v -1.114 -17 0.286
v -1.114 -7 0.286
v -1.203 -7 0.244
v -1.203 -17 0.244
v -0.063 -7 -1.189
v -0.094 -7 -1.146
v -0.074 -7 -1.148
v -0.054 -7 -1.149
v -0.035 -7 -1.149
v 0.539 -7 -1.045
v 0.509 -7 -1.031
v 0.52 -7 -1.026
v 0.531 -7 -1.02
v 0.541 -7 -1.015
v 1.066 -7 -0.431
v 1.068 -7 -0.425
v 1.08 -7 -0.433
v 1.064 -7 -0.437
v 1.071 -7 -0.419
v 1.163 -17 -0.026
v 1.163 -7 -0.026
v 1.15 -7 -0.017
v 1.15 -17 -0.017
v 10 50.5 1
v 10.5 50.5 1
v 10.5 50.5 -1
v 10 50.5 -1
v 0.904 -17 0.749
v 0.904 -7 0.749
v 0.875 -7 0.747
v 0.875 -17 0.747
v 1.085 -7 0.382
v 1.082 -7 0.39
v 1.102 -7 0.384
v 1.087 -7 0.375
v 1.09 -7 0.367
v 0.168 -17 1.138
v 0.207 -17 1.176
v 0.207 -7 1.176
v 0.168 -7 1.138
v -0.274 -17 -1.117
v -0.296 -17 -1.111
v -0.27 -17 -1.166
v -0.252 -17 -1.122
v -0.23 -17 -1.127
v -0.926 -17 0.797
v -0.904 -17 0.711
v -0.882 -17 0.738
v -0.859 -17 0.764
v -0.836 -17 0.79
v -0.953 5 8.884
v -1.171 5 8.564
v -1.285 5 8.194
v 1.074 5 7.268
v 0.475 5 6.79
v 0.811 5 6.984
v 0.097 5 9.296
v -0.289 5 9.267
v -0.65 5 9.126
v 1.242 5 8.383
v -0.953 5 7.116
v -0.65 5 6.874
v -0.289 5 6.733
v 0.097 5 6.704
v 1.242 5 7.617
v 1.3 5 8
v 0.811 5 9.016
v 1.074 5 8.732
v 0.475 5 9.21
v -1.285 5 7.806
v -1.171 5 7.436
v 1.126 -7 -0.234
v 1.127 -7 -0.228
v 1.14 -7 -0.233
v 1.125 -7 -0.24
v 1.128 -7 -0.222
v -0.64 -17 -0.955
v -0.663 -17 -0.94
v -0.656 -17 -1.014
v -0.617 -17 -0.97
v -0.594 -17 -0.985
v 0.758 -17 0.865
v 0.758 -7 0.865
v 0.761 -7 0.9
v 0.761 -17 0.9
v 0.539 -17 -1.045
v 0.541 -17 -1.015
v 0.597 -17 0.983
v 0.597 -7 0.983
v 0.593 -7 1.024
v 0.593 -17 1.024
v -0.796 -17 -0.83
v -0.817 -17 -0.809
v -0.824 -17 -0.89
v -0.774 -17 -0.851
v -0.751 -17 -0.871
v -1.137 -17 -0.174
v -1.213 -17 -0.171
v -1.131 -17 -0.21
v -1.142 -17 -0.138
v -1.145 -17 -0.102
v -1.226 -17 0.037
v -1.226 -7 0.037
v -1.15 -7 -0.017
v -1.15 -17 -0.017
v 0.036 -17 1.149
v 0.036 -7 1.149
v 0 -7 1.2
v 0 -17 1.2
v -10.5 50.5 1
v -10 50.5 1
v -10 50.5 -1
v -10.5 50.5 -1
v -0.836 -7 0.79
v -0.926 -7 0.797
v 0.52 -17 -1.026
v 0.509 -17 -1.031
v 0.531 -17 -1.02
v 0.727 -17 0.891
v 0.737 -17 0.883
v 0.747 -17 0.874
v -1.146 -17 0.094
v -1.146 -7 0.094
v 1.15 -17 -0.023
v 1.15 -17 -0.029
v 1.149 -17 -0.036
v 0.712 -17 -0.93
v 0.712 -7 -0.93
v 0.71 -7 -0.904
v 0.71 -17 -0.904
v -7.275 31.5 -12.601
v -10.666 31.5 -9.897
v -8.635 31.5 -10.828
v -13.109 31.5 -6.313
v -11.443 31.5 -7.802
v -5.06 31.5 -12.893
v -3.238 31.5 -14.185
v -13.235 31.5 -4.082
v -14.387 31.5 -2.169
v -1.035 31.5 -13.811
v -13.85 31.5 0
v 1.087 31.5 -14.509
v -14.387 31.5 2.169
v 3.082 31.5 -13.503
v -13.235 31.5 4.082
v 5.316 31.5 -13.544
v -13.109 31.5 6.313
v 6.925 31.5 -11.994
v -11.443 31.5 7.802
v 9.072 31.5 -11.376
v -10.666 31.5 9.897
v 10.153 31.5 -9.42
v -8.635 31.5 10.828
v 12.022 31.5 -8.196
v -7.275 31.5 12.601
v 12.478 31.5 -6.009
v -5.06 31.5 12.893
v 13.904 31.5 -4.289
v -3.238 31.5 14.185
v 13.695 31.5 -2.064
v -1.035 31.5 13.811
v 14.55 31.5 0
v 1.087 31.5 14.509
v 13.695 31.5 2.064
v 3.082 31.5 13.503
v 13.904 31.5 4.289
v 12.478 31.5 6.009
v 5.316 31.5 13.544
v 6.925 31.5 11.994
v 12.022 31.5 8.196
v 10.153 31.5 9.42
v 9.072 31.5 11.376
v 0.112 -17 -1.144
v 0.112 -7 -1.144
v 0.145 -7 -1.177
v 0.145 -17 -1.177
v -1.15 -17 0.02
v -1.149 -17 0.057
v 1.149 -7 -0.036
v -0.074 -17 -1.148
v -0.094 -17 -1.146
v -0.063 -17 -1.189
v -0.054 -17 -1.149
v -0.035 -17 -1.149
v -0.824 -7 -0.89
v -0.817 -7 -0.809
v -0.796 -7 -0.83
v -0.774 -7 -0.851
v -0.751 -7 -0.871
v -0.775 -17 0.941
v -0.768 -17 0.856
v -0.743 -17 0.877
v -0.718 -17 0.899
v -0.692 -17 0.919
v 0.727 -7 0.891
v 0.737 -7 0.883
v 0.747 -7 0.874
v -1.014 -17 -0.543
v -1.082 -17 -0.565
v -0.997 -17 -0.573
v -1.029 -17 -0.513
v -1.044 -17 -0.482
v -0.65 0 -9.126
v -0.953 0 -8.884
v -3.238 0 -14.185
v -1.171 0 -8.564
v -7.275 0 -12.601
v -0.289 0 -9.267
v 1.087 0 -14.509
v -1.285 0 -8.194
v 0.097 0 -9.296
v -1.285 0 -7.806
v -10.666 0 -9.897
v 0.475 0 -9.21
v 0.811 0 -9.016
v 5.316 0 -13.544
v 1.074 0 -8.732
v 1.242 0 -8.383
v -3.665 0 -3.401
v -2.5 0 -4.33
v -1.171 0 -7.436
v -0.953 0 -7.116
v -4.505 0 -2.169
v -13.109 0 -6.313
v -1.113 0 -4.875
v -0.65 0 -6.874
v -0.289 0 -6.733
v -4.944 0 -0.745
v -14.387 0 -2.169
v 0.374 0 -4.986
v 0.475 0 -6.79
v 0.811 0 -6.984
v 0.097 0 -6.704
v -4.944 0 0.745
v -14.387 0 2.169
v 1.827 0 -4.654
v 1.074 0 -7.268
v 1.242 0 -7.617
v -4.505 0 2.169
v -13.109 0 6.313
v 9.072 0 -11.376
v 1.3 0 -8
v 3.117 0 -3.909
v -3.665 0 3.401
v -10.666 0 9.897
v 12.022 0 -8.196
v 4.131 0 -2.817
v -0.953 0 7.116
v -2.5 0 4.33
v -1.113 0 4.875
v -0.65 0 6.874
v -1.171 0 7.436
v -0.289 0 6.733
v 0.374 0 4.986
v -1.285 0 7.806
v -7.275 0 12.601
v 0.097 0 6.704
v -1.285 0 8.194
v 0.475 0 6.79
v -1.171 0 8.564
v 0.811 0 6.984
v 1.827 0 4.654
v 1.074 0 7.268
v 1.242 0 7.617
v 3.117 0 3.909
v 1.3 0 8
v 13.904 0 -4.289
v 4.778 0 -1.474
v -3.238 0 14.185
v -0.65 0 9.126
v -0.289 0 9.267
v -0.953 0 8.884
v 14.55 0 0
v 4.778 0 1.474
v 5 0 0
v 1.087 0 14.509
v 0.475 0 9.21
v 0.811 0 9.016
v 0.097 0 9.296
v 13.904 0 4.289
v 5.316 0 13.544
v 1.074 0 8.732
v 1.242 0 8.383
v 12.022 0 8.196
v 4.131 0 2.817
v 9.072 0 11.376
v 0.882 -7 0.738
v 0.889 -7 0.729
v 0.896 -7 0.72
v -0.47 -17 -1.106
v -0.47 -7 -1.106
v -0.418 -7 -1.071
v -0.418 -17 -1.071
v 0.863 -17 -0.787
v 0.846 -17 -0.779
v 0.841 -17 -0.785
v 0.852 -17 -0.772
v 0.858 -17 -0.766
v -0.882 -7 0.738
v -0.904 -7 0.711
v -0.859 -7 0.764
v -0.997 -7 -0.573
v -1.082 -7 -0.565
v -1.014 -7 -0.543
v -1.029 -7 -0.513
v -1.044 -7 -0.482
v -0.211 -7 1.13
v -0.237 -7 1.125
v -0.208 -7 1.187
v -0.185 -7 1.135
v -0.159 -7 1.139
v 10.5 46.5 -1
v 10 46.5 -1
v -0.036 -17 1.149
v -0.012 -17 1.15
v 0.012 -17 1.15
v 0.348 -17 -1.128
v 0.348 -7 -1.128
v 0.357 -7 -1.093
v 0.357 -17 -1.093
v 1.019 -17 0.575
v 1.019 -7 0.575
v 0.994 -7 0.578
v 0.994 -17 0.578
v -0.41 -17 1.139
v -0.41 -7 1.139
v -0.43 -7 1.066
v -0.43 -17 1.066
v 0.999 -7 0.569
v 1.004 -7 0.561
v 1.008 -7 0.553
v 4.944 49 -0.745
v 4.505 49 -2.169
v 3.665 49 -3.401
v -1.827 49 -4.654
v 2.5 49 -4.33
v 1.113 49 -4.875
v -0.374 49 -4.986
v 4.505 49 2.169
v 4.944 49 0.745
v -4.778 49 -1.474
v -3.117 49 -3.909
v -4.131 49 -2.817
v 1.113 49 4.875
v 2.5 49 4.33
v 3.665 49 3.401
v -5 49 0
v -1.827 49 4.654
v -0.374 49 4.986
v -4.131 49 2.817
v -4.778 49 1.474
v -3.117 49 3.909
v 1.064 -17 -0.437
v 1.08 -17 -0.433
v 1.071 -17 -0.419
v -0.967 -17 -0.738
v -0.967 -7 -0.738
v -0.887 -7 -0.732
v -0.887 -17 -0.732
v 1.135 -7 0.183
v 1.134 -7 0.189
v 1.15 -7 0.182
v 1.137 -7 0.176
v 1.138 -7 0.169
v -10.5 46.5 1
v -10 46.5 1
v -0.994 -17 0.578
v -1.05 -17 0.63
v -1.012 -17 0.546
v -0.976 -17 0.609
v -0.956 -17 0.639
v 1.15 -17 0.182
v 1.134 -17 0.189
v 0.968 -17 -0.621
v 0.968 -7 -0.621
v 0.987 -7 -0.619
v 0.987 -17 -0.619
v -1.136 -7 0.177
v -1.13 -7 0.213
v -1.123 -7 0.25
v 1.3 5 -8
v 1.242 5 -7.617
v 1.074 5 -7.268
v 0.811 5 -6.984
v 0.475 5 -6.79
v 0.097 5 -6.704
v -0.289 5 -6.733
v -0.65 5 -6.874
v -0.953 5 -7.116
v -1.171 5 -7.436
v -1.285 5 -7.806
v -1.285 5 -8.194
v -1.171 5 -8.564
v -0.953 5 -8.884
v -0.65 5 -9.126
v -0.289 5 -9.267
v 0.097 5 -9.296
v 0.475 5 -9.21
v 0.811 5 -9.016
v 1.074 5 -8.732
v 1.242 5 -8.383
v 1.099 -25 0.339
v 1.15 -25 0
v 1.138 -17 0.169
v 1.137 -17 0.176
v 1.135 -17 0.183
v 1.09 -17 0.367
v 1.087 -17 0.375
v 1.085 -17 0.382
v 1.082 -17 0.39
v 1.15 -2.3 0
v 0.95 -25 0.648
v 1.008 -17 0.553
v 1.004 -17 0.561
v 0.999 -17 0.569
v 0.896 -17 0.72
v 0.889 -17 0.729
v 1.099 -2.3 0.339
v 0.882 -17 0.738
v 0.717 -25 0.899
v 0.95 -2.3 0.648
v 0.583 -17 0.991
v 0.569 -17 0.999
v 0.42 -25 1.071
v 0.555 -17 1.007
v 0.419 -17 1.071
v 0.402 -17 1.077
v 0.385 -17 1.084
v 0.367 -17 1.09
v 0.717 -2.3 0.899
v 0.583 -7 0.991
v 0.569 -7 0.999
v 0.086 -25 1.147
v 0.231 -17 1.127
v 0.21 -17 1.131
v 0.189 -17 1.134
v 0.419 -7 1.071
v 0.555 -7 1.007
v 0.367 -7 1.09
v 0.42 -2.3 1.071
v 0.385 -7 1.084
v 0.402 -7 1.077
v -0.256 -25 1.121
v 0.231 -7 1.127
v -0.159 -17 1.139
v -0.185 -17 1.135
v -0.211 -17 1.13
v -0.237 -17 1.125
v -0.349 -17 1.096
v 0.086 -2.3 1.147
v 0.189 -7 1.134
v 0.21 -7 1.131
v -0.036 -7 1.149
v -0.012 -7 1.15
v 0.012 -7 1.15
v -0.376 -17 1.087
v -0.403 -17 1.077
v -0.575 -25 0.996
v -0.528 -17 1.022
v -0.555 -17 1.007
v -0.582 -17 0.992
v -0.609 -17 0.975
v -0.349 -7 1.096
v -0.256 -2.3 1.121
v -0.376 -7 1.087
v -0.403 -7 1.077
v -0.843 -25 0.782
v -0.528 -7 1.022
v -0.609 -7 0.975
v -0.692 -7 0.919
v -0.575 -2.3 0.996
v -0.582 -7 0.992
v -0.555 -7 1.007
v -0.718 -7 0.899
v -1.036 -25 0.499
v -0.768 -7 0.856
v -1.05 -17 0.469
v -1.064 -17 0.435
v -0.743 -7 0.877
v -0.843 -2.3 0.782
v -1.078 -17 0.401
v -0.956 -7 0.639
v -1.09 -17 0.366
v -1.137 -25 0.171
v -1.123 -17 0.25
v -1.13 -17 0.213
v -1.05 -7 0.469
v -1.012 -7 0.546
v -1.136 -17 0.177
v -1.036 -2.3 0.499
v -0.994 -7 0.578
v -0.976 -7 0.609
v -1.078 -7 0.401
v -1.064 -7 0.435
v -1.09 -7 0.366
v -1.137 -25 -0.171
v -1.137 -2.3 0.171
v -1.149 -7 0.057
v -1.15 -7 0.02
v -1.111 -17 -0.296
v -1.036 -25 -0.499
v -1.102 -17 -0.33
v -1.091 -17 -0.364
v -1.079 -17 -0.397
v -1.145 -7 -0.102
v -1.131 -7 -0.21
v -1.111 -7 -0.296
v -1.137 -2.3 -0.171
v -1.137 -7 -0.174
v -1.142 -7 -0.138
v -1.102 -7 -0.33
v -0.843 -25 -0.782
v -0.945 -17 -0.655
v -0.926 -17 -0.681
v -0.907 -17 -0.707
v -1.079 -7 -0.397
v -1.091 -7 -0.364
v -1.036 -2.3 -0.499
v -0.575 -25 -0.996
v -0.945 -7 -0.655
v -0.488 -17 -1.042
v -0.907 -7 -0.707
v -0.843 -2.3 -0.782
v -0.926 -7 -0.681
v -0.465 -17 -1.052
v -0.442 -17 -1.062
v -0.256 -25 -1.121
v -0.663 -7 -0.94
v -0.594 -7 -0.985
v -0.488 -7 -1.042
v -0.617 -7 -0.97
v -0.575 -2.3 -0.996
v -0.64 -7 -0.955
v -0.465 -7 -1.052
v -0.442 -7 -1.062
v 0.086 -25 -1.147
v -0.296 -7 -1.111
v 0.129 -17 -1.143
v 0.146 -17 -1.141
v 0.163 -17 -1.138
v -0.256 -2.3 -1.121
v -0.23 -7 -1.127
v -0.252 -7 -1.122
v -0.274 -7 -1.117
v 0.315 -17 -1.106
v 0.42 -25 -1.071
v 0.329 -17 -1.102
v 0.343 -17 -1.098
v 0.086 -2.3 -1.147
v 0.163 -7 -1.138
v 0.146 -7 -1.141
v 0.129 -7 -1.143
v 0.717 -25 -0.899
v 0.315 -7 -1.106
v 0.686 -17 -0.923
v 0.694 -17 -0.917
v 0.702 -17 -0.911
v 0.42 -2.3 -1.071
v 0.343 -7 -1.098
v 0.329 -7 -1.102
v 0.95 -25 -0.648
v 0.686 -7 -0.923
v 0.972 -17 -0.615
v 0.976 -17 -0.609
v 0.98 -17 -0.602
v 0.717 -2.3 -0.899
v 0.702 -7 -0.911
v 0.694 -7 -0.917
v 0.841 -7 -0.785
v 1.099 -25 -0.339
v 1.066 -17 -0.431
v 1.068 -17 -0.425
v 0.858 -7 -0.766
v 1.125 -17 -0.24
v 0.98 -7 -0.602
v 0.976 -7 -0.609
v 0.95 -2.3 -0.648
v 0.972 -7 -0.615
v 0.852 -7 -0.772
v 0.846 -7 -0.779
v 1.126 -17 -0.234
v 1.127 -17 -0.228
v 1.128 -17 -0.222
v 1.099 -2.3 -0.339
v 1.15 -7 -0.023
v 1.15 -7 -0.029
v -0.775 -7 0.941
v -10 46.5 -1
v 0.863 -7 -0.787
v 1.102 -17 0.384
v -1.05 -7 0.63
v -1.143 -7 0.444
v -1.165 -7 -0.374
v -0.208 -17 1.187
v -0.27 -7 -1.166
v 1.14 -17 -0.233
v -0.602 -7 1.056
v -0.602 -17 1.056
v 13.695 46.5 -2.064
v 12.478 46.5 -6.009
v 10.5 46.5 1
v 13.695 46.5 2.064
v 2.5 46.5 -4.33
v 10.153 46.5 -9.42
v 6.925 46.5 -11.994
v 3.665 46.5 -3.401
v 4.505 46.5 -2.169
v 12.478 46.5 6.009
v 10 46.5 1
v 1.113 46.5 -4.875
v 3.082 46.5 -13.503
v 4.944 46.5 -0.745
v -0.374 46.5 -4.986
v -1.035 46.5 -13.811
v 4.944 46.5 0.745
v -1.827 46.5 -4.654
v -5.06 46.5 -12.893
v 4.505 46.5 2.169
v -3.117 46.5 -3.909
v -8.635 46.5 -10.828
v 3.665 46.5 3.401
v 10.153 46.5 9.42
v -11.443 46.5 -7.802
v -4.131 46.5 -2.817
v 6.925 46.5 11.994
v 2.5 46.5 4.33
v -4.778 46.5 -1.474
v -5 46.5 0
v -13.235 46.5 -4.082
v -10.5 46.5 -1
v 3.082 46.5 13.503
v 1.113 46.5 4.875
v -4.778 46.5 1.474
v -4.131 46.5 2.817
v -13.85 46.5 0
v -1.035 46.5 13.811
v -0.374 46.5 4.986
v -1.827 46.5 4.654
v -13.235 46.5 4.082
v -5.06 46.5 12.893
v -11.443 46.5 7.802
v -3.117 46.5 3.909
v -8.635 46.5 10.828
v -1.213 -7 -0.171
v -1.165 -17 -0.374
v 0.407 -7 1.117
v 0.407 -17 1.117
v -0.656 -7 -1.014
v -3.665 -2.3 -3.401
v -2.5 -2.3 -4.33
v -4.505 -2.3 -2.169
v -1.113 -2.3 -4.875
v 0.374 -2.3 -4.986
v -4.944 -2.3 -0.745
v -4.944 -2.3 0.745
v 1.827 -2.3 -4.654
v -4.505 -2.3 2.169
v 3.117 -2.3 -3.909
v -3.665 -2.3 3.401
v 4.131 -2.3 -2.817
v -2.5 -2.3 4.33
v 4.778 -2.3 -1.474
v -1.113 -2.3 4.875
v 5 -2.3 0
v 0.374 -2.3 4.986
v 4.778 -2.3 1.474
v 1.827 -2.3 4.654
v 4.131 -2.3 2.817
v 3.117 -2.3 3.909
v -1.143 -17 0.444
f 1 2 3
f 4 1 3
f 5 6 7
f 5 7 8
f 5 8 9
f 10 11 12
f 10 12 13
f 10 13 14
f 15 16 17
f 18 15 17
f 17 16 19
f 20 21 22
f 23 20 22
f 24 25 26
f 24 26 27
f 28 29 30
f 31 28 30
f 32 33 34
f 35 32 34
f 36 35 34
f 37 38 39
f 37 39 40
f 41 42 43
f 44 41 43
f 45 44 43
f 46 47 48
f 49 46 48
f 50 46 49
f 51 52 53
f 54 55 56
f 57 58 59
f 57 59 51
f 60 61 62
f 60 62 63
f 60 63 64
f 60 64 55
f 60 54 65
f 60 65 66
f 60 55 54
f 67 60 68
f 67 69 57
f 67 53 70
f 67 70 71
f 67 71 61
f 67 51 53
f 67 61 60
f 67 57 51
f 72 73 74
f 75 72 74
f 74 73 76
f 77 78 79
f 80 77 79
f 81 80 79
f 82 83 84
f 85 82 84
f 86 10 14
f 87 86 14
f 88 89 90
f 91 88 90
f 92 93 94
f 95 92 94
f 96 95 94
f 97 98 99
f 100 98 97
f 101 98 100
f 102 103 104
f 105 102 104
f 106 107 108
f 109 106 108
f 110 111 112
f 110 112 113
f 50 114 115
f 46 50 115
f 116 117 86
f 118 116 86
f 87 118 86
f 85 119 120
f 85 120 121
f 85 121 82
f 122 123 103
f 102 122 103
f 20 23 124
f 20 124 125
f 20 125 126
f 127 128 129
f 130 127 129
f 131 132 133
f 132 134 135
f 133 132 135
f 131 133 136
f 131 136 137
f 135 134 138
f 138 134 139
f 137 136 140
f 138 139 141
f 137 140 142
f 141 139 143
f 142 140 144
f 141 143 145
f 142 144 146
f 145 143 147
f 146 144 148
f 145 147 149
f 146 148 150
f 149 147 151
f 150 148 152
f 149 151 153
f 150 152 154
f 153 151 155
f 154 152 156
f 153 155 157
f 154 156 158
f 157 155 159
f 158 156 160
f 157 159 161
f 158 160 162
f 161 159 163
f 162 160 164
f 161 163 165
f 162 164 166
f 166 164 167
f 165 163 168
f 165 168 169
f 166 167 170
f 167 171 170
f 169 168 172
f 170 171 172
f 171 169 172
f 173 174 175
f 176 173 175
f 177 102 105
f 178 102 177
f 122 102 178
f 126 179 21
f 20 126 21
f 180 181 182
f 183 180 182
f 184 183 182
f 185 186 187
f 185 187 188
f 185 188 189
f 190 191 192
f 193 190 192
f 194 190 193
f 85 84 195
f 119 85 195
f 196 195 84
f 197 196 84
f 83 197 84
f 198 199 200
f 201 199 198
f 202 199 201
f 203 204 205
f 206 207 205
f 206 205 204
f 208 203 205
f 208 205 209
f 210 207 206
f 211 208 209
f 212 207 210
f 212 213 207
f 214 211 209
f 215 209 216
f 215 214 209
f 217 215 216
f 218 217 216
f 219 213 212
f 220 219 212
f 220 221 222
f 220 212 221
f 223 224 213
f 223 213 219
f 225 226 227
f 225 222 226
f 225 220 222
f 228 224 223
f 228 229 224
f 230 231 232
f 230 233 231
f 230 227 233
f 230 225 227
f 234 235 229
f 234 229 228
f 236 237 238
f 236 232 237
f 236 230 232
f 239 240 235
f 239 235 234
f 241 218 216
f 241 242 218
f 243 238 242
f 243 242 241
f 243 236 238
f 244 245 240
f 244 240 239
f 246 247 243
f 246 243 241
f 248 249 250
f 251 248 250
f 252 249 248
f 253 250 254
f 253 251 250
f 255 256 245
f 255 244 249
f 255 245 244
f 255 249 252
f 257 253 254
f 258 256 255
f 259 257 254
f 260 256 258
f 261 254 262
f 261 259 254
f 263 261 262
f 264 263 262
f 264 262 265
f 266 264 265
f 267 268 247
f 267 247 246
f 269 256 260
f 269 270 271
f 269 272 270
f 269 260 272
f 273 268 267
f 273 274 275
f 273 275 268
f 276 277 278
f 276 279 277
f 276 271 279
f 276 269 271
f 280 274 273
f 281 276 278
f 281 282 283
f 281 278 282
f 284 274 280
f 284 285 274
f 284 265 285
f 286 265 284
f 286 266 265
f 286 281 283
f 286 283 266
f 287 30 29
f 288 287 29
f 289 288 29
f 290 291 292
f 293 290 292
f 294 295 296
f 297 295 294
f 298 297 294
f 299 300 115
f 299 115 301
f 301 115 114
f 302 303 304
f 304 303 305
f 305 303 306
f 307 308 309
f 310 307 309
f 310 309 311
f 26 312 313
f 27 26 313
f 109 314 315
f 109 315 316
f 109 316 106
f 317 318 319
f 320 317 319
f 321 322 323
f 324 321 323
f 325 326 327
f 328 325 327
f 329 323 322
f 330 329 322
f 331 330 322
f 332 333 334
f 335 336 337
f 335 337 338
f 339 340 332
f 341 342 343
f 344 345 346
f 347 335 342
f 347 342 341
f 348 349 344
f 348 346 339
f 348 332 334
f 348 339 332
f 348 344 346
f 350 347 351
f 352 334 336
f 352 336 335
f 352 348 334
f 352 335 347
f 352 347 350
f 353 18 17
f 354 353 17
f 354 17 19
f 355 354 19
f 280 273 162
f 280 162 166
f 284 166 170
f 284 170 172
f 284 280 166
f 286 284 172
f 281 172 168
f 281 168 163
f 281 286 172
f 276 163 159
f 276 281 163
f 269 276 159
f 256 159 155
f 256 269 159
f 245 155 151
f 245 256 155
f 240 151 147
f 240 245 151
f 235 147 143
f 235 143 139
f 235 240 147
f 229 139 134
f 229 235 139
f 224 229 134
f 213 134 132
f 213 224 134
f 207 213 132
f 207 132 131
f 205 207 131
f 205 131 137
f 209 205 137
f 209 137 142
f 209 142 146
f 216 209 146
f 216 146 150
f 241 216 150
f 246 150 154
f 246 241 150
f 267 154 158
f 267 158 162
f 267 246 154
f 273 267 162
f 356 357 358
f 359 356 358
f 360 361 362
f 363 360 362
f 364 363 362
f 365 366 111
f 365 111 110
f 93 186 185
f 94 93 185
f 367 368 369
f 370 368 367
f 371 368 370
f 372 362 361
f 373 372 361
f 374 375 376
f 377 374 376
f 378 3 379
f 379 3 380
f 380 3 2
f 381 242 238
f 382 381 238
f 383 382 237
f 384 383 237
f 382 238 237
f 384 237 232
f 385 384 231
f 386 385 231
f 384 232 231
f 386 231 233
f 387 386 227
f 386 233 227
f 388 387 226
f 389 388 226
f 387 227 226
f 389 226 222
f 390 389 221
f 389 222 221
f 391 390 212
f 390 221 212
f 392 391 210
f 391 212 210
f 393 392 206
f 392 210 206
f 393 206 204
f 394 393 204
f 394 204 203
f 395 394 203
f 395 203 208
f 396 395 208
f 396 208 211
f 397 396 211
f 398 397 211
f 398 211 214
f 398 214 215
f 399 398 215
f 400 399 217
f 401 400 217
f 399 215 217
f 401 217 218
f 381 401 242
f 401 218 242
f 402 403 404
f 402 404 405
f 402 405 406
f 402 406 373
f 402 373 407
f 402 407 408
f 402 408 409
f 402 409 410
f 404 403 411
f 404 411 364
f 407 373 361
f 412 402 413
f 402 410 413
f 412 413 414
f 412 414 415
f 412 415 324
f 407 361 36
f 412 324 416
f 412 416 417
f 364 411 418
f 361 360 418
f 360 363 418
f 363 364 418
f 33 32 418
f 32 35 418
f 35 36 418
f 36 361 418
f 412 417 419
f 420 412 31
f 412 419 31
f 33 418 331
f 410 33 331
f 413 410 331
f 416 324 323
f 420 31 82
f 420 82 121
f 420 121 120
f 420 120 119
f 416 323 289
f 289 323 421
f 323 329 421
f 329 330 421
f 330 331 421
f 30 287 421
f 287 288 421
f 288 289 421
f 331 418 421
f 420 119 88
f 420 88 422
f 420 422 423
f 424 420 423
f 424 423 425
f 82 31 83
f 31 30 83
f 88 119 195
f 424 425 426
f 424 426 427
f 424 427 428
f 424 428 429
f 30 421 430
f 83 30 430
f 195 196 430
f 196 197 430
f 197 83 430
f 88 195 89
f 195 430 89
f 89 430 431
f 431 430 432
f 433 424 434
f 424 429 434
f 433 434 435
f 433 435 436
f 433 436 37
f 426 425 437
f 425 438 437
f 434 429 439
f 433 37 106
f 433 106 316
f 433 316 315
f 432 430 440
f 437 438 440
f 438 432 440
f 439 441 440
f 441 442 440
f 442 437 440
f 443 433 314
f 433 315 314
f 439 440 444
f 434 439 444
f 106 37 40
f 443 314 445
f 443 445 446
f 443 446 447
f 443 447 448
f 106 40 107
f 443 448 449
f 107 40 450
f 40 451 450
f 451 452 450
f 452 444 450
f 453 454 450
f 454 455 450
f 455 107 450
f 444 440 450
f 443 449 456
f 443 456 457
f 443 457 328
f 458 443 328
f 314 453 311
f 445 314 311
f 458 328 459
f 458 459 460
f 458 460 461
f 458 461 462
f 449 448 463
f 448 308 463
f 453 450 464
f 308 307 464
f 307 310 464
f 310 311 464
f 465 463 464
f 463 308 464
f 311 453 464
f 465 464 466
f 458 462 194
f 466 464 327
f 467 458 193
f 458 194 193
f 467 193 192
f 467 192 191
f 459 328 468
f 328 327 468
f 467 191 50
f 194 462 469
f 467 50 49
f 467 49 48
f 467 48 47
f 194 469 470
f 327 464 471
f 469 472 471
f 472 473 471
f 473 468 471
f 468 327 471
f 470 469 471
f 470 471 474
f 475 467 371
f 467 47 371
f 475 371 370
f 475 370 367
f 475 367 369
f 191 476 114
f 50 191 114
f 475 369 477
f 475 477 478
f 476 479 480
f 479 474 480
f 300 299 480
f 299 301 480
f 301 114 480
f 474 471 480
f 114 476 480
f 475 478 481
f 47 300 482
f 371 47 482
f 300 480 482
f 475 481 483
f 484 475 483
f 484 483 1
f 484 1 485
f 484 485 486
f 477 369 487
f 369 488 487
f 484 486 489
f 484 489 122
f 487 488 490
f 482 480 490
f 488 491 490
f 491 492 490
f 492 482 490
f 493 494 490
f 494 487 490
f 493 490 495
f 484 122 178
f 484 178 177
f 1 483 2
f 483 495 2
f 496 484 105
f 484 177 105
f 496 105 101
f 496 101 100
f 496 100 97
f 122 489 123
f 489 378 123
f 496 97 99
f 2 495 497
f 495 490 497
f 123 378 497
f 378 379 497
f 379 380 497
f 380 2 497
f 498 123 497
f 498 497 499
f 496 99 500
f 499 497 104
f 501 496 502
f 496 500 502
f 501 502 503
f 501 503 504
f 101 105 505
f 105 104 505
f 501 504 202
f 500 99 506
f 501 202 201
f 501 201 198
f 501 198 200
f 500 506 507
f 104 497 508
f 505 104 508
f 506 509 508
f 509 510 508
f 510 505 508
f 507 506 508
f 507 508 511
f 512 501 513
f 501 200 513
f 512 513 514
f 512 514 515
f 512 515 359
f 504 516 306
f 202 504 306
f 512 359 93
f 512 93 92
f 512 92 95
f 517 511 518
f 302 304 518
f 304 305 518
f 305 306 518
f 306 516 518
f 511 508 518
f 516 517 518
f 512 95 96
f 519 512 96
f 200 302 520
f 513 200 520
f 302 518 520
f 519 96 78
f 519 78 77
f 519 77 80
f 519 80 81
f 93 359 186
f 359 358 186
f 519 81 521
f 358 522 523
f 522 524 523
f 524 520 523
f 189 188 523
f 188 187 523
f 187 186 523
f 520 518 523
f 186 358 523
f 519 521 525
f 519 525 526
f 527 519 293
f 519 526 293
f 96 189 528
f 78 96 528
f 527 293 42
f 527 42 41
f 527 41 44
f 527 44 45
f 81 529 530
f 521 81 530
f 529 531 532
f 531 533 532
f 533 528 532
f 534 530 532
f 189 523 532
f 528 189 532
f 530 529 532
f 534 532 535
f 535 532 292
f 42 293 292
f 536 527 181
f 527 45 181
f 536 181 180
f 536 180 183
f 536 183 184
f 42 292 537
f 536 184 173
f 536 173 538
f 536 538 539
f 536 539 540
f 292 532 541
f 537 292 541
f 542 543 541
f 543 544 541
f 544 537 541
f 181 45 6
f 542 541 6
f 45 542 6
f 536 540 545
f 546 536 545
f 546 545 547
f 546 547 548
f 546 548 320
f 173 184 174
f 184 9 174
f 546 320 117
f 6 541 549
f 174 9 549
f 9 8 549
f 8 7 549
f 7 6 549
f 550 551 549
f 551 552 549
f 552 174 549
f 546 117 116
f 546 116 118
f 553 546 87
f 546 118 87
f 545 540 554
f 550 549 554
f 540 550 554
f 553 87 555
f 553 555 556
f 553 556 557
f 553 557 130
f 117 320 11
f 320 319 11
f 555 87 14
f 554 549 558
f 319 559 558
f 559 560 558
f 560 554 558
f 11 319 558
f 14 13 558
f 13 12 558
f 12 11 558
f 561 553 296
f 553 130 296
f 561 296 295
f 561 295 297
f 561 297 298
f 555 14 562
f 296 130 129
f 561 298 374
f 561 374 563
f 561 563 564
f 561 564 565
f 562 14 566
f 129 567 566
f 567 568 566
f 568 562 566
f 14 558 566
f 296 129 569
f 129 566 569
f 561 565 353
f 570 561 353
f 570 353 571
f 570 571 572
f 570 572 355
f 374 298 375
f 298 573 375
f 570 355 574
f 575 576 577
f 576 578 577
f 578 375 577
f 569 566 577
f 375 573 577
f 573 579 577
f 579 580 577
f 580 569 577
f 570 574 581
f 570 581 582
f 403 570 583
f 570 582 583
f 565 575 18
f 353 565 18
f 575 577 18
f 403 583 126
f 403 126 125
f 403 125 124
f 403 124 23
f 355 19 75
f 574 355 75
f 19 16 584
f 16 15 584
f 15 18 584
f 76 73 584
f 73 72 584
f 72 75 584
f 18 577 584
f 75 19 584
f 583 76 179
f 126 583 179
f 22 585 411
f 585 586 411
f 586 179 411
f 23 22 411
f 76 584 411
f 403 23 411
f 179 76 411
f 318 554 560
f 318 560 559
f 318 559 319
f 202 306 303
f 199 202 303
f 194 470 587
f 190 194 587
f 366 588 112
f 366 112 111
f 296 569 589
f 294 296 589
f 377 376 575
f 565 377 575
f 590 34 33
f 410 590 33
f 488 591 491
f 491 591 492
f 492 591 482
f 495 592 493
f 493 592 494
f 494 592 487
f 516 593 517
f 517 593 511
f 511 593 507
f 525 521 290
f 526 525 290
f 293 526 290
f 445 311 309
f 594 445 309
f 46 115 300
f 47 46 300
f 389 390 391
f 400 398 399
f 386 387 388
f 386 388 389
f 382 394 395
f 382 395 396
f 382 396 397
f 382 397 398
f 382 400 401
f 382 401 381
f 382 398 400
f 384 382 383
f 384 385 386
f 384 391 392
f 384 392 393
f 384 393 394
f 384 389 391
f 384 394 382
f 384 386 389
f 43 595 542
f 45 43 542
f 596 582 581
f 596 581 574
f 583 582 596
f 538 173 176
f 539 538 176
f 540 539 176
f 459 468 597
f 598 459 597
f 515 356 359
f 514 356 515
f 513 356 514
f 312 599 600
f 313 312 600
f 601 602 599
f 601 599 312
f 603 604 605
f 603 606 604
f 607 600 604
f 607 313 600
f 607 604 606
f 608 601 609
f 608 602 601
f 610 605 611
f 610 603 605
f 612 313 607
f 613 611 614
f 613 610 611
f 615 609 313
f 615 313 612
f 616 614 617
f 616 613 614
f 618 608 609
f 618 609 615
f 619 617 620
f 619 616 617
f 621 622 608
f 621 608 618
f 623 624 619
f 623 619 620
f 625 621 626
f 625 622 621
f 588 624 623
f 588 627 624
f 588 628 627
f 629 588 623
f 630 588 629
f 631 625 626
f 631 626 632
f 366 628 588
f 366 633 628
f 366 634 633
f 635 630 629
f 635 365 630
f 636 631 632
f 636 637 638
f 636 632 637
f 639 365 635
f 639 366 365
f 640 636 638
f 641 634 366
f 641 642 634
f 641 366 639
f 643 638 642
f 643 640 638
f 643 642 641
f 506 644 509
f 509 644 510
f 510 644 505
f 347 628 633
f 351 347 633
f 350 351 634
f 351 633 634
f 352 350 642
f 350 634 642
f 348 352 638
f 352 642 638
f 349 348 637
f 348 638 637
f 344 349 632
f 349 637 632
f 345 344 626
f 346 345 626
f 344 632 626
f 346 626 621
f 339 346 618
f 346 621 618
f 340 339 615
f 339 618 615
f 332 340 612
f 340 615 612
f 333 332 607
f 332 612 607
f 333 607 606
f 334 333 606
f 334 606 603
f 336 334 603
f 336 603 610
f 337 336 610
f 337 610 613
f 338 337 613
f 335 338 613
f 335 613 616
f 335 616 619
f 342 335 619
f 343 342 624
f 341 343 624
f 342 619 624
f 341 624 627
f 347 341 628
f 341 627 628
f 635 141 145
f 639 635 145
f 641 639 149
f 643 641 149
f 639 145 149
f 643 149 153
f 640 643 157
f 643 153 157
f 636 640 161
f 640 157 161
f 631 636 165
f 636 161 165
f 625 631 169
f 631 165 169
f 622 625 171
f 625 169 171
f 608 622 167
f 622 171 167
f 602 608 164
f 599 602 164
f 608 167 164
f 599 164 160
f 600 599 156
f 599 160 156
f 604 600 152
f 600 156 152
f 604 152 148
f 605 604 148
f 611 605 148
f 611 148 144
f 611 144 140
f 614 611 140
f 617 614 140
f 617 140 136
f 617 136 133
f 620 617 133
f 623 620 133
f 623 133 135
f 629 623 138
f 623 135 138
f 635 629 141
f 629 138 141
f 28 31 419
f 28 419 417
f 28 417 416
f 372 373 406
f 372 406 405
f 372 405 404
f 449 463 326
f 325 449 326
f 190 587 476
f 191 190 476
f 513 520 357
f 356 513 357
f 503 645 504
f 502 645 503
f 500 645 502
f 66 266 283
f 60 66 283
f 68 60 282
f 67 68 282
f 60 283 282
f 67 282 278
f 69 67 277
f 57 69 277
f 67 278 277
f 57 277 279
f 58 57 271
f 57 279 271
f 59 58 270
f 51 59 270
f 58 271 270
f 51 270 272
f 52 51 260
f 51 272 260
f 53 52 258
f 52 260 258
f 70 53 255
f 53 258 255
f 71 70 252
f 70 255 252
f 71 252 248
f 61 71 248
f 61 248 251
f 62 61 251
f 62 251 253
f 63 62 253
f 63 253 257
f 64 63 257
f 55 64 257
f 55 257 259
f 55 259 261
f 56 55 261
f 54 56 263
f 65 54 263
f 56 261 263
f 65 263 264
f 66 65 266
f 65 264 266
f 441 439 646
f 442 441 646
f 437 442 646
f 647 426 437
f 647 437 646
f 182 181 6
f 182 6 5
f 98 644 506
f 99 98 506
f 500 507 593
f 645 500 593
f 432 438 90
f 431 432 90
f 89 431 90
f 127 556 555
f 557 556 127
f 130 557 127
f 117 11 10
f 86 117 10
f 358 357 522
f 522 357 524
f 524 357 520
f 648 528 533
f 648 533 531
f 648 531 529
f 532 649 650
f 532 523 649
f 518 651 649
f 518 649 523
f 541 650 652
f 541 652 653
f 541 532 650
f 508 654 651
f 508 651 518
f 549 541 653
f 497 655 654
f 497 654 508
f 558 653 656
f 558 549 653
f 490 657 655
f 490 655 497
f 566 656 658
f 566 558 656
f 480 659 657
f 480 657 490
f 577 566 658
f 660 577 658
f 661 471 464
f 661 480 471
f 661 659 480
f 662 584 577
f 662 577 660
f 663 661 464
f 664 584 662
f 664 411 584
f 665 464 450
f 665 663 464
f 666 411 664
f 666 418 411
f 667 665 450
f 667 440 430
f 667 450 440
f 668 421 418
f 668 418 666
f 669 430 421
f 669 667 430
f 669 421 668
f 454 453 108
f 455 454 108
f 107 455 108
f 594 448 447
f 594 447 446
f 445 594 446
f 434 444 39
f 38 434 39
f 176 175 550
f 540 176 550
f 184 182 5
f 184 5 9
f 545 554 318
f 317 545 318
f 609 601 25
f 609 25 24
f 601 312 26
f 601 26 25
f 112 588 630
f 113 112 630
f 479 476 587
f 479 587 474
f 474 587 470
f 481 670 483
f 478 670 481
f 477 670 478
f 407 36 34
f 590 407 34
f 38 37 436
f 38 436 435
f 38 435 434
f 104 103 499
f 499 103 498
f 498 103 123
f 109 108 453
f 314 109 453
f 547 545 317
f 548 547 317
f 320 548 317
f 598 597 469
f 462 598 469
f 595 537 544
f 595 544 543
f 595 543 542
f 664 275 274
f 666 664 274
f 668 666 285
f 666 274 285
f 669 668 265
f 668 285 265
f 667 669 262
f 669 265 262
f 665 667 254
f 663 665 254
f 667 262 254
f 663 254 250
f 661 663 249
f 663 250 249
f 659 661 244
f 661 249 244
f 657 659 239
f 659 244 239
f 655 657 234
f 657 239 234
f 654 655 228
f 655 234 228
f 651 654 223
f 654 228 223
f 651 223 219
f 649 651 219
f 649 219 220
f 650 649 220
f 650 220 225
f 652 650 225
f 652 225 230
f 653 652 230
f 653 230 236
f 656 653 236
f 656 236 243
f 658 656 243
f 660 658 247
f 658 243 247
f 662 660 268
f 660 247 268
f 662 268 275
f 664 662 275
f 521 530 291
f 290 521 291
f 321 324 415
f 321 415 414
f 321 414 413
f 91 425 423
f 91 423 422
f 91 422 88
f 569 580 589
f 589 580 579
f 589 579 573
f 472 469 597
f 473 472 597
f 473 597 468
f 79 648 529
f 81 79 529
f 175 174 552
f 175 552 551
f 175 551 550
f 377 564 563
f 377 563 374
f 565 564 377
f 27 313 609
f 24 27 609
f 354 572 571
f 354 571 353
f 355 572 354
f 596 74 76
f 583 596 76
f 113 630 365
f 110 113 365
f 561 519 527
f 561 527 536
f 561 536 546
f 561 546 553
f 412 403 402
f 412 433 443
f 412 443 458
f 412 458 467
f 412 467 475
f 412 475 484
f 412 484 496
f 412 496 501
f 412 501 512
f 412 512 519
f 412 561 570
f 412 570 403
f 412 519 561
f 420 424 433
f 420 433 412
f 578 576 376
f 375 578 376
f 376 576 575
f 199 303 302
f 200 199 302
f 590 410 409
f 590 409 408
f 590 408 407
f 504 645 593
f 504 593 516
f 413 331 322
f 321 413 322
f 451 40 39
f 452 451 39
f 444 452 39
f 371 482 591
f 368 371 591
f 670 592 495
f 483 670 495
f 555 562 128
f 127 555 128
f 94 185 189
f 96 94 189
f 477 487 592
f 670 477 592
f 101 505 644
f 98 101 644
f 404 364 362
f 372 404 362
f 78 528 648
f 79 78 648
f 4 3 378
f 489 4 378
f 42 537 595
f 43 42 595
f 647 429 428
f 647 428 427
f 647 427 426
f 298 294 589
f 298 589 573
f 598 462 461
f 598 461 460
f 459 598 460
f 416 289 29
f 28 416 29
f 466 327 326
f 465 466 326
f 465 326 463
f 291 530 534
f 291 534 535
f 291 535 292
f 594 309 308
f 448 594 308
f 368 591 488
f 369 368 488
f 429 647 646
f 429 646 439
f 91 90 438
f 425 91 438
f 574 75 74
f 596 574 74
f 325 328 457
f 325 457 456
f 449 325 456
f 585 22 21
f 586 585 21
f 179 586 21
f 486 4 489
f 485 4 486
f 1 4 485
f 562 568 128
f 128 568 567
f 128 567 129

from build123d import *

# Parameters (mm, degrees)
F0_R      = 14.55
F1_DEPTH  = 31.5
F2_R      = 13.85
F3_DEPTH  = 15
F4_R      = 5
F5_DEPTH  = 2.3
F6_R      = 1.15
F7_DEPTH  = 22.7
F8_R      = 1.3
F9_DEPTH  = 5
F10_R     = 5
F11_DEPTH = 2.5
F12_W     = 0.5
F12_H     = 2
F13_DEPTH = 4
F16_DEPTH = 10


with BuildPart() as f1:
    # F0 (on Front) → F1 (new body)
    with BuildSketch(Plane.XZ):
        Circle(F0_R)
    extrude(amount=-F1_DEPTH)

    # F2 (on face) → F3 (join)
    with BuildSketch(Plane(origin=(0, 31.5, 0), x_dir=(-1, 0, 0), z_dir=(0, 1, 0))):
        Circle(F2_R)
    extrude(amount=F3_DEPTH)

    # F4 (on face) → F5 (join)
    with BuildSketch(Plane.XZ):
        Circle(F4_R)
    extrude(amount=F5_DEPTH)

    # F6 (on face) → F7 (join)
    with BuildSketch(Plane.XZ.offset(2.3)):
        Circle(F6_R)
    extrude(amount=F7_DEPTH)

    # F8 (on face) → F9 (cut)
    with BuildSketch(Plane.XZ):
        with Locations((0, 8)):
            Circle(F8_R)
        with Locations((0, -8)):
            Circle(F8_R)
    extrude(amount=-F9_DEPTH, mode=Mode.SUBTRACT)

    # F10 (on face) → F11 (join)
    with BuildSketch(Plane(origin=(0, 46.5, 0), x_dir=(-1, 0, 0), z_dir=(0, 1, 0))):
        Circle(F10_R)
    extrude(amount=F11_DEPTH)

    # F12 (on face) → F13 (join)
    with BuildSketch(Plane(origin=(0, 46.5, 0), x_dir=(-1, 0, 0), z_dir=(0, 1, 0))):
        with Locations((-10.25, 0)):
            Rectangle(F12_W, F12_H)
        with Locations((10.25, 0)):
            Rectangle(F12_W, F12_H)
    extrude(amount=F13_DEPTH)

    # F15 (on offset) → F16 (join)
    with BuildSketch(Plane.XZ.offset(7)):
        Polygon((0.15, 0.988686), (0.004988, 0.032877), (0.19347, 0.969916), (0.277389, 1.027876), (0.206972, 1.176383), (0.095135, 1.065977), align=None)
        Polygon((0.317998, 0.942232), (0.009215, 0.026125), (0.357549, 0.916199), (0.450257, 0.958705), (0.406698, 1.117184), (0.277389, 1.027876), align=None)
        Polygon((0.022556, 0.994326), (0.095135, 1.065977), (0, 1.2), (-0.090965, 1.071852), (-0.023513, 1.005262), (-0.000347, 0.038793), align=None)
        Polygon((0.59311, 1.024202), (0.450257, 0.958705), (0.475378, 0.86731), (0.012205, 0.018741), (0.509807, 0.834805), (0.608488, 0.860567), align=None)
        Polygon((-0.15, 0.988686), (-0.090965, 1.071852), (-0.207928, 1.187318), (-0.275259, 1.045321), (-0.197268, 0.991456), (-0.006629, 0.043692), align=None)
        Polygon((0.760543, 0.900263), (0.608488, 0.860567), (0.617356, 0.766199), (0.013868, 0.01095), (0.645618, 0.728209), (0.747273, 0.736444), align=None)
        Polygon((-0.318955, 0.953168), (-0.275259, 1.045321), (-0.410496, 1.138723), (-0.452146, 0.987191), (-0.365986, 0.947687), (-0.013666, 0.047427), align=None)
        Polygon((0.903912, 0.749132), (0.747273, 0.736444), (0.73962, 0.641969), (0.014152, 0.002989), (0.760855, 0.599649), (0.862396, 0.590106), align=None)
        Polygon((-0.524541, 0.875286), (-0.021244, 0.049882), (-0.479176, 0.88885), (-0.452146, 0.987191), (-0.601547, 1.055691), (-0.616251, 0.899228), align=None)
        Polygon((0.838454, 0.498396), (0.01305, -0.004901), (0.852018, 0.453031), (0.950359, 0.426001), (1.018859, 0.575402), (0.862396, 0.590106), align=None)
        Polygon((-0.668114, 0.776452), (-0.029134, 0.050985), (-0.625794, 0.797687), (-0.616251, 0.899228), (-0.775277, 0.940744), (-0.762589, 0.784105), align=None)
        Polygon((0.910855, 0.339841), (0.010595, -0.012479), (0.916335, 0.29281), (1.008489, 0.249114), (1.101891, 0.384351), (0.950359, 0.426001), align=None)
        Polygon((-0.792344, 0.654188), (-0.037095, 0.0507), (-0.754354, 0.68245), (-0.762589, 0.784105), (-0.926408, 0.797376), (-0.886712, 0.64532), align=None)
        Polygon((0.954624, 0.171123), (0.00686, -0.019516), (0.951854, 0.123855), (1.03502, 0.06482), (1.150486, 0.181783), (1.008489, 0.249114), align=None)
        Polygon((-0.893455, 0.51221), (-0.044886, 0.049037), (-0.86095, 0.546639), (-0.886712, 0.64532), (-1.050347, 0.629942), (-0.98485, 0.487089), align=None)
        Polygon((0.96843, -0.002632), (0.001961, -0.025798), (0.957494, -0.048701), (1.029145, -0.12128), (1.163168, -0.026145), (1.03502, 0.06482), align=None)
        Polygon((-0.968377, 0.35483), (-0.05227, 0.046047), (-0.942344, 0.394381), (-0.98485, 0.487089), (-1.143329, 0.44353), (-1.054021, 0.314221), align=None)
        Polygon((0.951854, -0.176145), (-0.003955, -0.031133), (0.933084, -0.219615), (0.991044, -0.303534), (1.13955, -0.233117), (1.029145, -0.12128), align=None)
        Polygon((-1.014831, 0.186832), (-0.059022, 0.04182), (-0.996062, 0.230302), (-1.054021, 0.314221), (-1.202528, 0.243804), (-1.092122, 0.131968), align=None)
        Polygon((0.9054, -0.344143), (-0.010707, -0.03536), (0.879367, -0.383694), (0.921873, -0.476402), (1.080352, -0.432843), (0.991044, -0.303534), align=None)
        Polygon((-1.031407, 0.013319), (-0.064938, 0.036485), (-1.020471, 0.059388), (-1.092122, 0.131968), (-1.226145, 0.036832), (-1.097997, -0.054133), align=None)
        Polygon((0.830478, -0.501523), (-0.018091, -0.03835), (0.797973, -0.535952), (0.823735, -0.634633), (0.98737, -0.619255), (0.921873, -0.476402), align=None)
        Polygon((-1.017601, -0.160436), (-0.069837, 0.030203), (-1.014831, -0.113168), (-1.097997, -0.054133), (-1.213463, -0.171096), (-1.071466, -0.238427), align=None)
        Polygon((0.729367, -0.643501), (-0.025882, -0.040013), (0.691377, -0.671763), (0.699612, -0.773418), (0.863431, -0.786688), (0.823735, -0.634633), align=None)
        Polygon((-0.973832, -0.329154), (-0.073572, 0.023166), (-0.979313, -0.282123), (-1.071466, -0.238427), (-1.164868, -0.373663), (-1.013336, -0.415314), align=None)
        Polygon((0.605137, -0.765765), (-0.033843, -0.040297), (0.562817, -0.787), (0.553274, -0.888541), (0.7123, -0.930057), (0.699612, -0.773418), align=None)
        Polygon((-0.901431, -0.487709), (-0.076027, 0.015588), (-0.914995, -0.442344), (-1.013336, -0.415314), (-1.081836, -0.564715), (-0.925373, -0.579419), align=None)
        Polygon((0.461563, -0.864599), (-0.041733, -0.039195), (0.416199, -0.878163), (0.389169, -0.976504), (0.53857, -1.045004), (0.553274, -0.888541), align=None)
        Polygon((-0.802597, -0.631282), (-0.07713, 0.007698), (-0.823832, -0.588962), (-0.925373, -0.579419), (-0.966889, -0.738445), (-0.81025, -0.725757), align=None)
        Polygon((0.303009, -0.937), (-0.049311, -0.03674), (0.255978, -0.94248), (0.212282, -1.034634), (0.347518, -1.128036), (0.389169, -0.976504), align=None)
        Polygon((-0.680334, -0.755512), (-0.076845, -0.000263), (-0.708595, -0.717522), (-0.81025, -0.725757), (-0.823521, -0.889576), (-0.671465, -0.84988), align=None)
        Polygon((0.134291, -0.980769), (-0.056348, -0.033005), (0.087023, -0.977999), (0.027988, -1.061165), (0.144951, -1.176631), (0.212282, -1.034634), align=None)
        Polygon((-0.538355, -0.856623), (-0.075182, -0.008054), (-0.572784, -0.824118), (-0.671465, -0.84988), (-0.656087, -1.013515), (-0.513234, -0.948018), align=None)
        Polygon((-0.039464, -0.994575), (-0.06263, -0.028106), (-0.085533, -0.983639), (-0.158113, -1.05529), (-0.062977, -1.189313), (0.027988, -1.061165), align=None)
        Polygon((-0.380976, -0.931545), (-0.072192, -0.015438), (-0.420526, -0.905512), (-0.513234, -0.948018), (-0.469675, -1.106497), (-0.340366, -1.017189), align=None)
        Polygon((-0.212977, -0.977999), (-0.067965, -0.02219), (-0.256447, -0.959229), (-0.340366, -1.017189), (-0.269949, -1.165696), (-0.158113, -1.05529), align=None)
    extrude(amount=F16_DEPTH)


solid = f1.part
